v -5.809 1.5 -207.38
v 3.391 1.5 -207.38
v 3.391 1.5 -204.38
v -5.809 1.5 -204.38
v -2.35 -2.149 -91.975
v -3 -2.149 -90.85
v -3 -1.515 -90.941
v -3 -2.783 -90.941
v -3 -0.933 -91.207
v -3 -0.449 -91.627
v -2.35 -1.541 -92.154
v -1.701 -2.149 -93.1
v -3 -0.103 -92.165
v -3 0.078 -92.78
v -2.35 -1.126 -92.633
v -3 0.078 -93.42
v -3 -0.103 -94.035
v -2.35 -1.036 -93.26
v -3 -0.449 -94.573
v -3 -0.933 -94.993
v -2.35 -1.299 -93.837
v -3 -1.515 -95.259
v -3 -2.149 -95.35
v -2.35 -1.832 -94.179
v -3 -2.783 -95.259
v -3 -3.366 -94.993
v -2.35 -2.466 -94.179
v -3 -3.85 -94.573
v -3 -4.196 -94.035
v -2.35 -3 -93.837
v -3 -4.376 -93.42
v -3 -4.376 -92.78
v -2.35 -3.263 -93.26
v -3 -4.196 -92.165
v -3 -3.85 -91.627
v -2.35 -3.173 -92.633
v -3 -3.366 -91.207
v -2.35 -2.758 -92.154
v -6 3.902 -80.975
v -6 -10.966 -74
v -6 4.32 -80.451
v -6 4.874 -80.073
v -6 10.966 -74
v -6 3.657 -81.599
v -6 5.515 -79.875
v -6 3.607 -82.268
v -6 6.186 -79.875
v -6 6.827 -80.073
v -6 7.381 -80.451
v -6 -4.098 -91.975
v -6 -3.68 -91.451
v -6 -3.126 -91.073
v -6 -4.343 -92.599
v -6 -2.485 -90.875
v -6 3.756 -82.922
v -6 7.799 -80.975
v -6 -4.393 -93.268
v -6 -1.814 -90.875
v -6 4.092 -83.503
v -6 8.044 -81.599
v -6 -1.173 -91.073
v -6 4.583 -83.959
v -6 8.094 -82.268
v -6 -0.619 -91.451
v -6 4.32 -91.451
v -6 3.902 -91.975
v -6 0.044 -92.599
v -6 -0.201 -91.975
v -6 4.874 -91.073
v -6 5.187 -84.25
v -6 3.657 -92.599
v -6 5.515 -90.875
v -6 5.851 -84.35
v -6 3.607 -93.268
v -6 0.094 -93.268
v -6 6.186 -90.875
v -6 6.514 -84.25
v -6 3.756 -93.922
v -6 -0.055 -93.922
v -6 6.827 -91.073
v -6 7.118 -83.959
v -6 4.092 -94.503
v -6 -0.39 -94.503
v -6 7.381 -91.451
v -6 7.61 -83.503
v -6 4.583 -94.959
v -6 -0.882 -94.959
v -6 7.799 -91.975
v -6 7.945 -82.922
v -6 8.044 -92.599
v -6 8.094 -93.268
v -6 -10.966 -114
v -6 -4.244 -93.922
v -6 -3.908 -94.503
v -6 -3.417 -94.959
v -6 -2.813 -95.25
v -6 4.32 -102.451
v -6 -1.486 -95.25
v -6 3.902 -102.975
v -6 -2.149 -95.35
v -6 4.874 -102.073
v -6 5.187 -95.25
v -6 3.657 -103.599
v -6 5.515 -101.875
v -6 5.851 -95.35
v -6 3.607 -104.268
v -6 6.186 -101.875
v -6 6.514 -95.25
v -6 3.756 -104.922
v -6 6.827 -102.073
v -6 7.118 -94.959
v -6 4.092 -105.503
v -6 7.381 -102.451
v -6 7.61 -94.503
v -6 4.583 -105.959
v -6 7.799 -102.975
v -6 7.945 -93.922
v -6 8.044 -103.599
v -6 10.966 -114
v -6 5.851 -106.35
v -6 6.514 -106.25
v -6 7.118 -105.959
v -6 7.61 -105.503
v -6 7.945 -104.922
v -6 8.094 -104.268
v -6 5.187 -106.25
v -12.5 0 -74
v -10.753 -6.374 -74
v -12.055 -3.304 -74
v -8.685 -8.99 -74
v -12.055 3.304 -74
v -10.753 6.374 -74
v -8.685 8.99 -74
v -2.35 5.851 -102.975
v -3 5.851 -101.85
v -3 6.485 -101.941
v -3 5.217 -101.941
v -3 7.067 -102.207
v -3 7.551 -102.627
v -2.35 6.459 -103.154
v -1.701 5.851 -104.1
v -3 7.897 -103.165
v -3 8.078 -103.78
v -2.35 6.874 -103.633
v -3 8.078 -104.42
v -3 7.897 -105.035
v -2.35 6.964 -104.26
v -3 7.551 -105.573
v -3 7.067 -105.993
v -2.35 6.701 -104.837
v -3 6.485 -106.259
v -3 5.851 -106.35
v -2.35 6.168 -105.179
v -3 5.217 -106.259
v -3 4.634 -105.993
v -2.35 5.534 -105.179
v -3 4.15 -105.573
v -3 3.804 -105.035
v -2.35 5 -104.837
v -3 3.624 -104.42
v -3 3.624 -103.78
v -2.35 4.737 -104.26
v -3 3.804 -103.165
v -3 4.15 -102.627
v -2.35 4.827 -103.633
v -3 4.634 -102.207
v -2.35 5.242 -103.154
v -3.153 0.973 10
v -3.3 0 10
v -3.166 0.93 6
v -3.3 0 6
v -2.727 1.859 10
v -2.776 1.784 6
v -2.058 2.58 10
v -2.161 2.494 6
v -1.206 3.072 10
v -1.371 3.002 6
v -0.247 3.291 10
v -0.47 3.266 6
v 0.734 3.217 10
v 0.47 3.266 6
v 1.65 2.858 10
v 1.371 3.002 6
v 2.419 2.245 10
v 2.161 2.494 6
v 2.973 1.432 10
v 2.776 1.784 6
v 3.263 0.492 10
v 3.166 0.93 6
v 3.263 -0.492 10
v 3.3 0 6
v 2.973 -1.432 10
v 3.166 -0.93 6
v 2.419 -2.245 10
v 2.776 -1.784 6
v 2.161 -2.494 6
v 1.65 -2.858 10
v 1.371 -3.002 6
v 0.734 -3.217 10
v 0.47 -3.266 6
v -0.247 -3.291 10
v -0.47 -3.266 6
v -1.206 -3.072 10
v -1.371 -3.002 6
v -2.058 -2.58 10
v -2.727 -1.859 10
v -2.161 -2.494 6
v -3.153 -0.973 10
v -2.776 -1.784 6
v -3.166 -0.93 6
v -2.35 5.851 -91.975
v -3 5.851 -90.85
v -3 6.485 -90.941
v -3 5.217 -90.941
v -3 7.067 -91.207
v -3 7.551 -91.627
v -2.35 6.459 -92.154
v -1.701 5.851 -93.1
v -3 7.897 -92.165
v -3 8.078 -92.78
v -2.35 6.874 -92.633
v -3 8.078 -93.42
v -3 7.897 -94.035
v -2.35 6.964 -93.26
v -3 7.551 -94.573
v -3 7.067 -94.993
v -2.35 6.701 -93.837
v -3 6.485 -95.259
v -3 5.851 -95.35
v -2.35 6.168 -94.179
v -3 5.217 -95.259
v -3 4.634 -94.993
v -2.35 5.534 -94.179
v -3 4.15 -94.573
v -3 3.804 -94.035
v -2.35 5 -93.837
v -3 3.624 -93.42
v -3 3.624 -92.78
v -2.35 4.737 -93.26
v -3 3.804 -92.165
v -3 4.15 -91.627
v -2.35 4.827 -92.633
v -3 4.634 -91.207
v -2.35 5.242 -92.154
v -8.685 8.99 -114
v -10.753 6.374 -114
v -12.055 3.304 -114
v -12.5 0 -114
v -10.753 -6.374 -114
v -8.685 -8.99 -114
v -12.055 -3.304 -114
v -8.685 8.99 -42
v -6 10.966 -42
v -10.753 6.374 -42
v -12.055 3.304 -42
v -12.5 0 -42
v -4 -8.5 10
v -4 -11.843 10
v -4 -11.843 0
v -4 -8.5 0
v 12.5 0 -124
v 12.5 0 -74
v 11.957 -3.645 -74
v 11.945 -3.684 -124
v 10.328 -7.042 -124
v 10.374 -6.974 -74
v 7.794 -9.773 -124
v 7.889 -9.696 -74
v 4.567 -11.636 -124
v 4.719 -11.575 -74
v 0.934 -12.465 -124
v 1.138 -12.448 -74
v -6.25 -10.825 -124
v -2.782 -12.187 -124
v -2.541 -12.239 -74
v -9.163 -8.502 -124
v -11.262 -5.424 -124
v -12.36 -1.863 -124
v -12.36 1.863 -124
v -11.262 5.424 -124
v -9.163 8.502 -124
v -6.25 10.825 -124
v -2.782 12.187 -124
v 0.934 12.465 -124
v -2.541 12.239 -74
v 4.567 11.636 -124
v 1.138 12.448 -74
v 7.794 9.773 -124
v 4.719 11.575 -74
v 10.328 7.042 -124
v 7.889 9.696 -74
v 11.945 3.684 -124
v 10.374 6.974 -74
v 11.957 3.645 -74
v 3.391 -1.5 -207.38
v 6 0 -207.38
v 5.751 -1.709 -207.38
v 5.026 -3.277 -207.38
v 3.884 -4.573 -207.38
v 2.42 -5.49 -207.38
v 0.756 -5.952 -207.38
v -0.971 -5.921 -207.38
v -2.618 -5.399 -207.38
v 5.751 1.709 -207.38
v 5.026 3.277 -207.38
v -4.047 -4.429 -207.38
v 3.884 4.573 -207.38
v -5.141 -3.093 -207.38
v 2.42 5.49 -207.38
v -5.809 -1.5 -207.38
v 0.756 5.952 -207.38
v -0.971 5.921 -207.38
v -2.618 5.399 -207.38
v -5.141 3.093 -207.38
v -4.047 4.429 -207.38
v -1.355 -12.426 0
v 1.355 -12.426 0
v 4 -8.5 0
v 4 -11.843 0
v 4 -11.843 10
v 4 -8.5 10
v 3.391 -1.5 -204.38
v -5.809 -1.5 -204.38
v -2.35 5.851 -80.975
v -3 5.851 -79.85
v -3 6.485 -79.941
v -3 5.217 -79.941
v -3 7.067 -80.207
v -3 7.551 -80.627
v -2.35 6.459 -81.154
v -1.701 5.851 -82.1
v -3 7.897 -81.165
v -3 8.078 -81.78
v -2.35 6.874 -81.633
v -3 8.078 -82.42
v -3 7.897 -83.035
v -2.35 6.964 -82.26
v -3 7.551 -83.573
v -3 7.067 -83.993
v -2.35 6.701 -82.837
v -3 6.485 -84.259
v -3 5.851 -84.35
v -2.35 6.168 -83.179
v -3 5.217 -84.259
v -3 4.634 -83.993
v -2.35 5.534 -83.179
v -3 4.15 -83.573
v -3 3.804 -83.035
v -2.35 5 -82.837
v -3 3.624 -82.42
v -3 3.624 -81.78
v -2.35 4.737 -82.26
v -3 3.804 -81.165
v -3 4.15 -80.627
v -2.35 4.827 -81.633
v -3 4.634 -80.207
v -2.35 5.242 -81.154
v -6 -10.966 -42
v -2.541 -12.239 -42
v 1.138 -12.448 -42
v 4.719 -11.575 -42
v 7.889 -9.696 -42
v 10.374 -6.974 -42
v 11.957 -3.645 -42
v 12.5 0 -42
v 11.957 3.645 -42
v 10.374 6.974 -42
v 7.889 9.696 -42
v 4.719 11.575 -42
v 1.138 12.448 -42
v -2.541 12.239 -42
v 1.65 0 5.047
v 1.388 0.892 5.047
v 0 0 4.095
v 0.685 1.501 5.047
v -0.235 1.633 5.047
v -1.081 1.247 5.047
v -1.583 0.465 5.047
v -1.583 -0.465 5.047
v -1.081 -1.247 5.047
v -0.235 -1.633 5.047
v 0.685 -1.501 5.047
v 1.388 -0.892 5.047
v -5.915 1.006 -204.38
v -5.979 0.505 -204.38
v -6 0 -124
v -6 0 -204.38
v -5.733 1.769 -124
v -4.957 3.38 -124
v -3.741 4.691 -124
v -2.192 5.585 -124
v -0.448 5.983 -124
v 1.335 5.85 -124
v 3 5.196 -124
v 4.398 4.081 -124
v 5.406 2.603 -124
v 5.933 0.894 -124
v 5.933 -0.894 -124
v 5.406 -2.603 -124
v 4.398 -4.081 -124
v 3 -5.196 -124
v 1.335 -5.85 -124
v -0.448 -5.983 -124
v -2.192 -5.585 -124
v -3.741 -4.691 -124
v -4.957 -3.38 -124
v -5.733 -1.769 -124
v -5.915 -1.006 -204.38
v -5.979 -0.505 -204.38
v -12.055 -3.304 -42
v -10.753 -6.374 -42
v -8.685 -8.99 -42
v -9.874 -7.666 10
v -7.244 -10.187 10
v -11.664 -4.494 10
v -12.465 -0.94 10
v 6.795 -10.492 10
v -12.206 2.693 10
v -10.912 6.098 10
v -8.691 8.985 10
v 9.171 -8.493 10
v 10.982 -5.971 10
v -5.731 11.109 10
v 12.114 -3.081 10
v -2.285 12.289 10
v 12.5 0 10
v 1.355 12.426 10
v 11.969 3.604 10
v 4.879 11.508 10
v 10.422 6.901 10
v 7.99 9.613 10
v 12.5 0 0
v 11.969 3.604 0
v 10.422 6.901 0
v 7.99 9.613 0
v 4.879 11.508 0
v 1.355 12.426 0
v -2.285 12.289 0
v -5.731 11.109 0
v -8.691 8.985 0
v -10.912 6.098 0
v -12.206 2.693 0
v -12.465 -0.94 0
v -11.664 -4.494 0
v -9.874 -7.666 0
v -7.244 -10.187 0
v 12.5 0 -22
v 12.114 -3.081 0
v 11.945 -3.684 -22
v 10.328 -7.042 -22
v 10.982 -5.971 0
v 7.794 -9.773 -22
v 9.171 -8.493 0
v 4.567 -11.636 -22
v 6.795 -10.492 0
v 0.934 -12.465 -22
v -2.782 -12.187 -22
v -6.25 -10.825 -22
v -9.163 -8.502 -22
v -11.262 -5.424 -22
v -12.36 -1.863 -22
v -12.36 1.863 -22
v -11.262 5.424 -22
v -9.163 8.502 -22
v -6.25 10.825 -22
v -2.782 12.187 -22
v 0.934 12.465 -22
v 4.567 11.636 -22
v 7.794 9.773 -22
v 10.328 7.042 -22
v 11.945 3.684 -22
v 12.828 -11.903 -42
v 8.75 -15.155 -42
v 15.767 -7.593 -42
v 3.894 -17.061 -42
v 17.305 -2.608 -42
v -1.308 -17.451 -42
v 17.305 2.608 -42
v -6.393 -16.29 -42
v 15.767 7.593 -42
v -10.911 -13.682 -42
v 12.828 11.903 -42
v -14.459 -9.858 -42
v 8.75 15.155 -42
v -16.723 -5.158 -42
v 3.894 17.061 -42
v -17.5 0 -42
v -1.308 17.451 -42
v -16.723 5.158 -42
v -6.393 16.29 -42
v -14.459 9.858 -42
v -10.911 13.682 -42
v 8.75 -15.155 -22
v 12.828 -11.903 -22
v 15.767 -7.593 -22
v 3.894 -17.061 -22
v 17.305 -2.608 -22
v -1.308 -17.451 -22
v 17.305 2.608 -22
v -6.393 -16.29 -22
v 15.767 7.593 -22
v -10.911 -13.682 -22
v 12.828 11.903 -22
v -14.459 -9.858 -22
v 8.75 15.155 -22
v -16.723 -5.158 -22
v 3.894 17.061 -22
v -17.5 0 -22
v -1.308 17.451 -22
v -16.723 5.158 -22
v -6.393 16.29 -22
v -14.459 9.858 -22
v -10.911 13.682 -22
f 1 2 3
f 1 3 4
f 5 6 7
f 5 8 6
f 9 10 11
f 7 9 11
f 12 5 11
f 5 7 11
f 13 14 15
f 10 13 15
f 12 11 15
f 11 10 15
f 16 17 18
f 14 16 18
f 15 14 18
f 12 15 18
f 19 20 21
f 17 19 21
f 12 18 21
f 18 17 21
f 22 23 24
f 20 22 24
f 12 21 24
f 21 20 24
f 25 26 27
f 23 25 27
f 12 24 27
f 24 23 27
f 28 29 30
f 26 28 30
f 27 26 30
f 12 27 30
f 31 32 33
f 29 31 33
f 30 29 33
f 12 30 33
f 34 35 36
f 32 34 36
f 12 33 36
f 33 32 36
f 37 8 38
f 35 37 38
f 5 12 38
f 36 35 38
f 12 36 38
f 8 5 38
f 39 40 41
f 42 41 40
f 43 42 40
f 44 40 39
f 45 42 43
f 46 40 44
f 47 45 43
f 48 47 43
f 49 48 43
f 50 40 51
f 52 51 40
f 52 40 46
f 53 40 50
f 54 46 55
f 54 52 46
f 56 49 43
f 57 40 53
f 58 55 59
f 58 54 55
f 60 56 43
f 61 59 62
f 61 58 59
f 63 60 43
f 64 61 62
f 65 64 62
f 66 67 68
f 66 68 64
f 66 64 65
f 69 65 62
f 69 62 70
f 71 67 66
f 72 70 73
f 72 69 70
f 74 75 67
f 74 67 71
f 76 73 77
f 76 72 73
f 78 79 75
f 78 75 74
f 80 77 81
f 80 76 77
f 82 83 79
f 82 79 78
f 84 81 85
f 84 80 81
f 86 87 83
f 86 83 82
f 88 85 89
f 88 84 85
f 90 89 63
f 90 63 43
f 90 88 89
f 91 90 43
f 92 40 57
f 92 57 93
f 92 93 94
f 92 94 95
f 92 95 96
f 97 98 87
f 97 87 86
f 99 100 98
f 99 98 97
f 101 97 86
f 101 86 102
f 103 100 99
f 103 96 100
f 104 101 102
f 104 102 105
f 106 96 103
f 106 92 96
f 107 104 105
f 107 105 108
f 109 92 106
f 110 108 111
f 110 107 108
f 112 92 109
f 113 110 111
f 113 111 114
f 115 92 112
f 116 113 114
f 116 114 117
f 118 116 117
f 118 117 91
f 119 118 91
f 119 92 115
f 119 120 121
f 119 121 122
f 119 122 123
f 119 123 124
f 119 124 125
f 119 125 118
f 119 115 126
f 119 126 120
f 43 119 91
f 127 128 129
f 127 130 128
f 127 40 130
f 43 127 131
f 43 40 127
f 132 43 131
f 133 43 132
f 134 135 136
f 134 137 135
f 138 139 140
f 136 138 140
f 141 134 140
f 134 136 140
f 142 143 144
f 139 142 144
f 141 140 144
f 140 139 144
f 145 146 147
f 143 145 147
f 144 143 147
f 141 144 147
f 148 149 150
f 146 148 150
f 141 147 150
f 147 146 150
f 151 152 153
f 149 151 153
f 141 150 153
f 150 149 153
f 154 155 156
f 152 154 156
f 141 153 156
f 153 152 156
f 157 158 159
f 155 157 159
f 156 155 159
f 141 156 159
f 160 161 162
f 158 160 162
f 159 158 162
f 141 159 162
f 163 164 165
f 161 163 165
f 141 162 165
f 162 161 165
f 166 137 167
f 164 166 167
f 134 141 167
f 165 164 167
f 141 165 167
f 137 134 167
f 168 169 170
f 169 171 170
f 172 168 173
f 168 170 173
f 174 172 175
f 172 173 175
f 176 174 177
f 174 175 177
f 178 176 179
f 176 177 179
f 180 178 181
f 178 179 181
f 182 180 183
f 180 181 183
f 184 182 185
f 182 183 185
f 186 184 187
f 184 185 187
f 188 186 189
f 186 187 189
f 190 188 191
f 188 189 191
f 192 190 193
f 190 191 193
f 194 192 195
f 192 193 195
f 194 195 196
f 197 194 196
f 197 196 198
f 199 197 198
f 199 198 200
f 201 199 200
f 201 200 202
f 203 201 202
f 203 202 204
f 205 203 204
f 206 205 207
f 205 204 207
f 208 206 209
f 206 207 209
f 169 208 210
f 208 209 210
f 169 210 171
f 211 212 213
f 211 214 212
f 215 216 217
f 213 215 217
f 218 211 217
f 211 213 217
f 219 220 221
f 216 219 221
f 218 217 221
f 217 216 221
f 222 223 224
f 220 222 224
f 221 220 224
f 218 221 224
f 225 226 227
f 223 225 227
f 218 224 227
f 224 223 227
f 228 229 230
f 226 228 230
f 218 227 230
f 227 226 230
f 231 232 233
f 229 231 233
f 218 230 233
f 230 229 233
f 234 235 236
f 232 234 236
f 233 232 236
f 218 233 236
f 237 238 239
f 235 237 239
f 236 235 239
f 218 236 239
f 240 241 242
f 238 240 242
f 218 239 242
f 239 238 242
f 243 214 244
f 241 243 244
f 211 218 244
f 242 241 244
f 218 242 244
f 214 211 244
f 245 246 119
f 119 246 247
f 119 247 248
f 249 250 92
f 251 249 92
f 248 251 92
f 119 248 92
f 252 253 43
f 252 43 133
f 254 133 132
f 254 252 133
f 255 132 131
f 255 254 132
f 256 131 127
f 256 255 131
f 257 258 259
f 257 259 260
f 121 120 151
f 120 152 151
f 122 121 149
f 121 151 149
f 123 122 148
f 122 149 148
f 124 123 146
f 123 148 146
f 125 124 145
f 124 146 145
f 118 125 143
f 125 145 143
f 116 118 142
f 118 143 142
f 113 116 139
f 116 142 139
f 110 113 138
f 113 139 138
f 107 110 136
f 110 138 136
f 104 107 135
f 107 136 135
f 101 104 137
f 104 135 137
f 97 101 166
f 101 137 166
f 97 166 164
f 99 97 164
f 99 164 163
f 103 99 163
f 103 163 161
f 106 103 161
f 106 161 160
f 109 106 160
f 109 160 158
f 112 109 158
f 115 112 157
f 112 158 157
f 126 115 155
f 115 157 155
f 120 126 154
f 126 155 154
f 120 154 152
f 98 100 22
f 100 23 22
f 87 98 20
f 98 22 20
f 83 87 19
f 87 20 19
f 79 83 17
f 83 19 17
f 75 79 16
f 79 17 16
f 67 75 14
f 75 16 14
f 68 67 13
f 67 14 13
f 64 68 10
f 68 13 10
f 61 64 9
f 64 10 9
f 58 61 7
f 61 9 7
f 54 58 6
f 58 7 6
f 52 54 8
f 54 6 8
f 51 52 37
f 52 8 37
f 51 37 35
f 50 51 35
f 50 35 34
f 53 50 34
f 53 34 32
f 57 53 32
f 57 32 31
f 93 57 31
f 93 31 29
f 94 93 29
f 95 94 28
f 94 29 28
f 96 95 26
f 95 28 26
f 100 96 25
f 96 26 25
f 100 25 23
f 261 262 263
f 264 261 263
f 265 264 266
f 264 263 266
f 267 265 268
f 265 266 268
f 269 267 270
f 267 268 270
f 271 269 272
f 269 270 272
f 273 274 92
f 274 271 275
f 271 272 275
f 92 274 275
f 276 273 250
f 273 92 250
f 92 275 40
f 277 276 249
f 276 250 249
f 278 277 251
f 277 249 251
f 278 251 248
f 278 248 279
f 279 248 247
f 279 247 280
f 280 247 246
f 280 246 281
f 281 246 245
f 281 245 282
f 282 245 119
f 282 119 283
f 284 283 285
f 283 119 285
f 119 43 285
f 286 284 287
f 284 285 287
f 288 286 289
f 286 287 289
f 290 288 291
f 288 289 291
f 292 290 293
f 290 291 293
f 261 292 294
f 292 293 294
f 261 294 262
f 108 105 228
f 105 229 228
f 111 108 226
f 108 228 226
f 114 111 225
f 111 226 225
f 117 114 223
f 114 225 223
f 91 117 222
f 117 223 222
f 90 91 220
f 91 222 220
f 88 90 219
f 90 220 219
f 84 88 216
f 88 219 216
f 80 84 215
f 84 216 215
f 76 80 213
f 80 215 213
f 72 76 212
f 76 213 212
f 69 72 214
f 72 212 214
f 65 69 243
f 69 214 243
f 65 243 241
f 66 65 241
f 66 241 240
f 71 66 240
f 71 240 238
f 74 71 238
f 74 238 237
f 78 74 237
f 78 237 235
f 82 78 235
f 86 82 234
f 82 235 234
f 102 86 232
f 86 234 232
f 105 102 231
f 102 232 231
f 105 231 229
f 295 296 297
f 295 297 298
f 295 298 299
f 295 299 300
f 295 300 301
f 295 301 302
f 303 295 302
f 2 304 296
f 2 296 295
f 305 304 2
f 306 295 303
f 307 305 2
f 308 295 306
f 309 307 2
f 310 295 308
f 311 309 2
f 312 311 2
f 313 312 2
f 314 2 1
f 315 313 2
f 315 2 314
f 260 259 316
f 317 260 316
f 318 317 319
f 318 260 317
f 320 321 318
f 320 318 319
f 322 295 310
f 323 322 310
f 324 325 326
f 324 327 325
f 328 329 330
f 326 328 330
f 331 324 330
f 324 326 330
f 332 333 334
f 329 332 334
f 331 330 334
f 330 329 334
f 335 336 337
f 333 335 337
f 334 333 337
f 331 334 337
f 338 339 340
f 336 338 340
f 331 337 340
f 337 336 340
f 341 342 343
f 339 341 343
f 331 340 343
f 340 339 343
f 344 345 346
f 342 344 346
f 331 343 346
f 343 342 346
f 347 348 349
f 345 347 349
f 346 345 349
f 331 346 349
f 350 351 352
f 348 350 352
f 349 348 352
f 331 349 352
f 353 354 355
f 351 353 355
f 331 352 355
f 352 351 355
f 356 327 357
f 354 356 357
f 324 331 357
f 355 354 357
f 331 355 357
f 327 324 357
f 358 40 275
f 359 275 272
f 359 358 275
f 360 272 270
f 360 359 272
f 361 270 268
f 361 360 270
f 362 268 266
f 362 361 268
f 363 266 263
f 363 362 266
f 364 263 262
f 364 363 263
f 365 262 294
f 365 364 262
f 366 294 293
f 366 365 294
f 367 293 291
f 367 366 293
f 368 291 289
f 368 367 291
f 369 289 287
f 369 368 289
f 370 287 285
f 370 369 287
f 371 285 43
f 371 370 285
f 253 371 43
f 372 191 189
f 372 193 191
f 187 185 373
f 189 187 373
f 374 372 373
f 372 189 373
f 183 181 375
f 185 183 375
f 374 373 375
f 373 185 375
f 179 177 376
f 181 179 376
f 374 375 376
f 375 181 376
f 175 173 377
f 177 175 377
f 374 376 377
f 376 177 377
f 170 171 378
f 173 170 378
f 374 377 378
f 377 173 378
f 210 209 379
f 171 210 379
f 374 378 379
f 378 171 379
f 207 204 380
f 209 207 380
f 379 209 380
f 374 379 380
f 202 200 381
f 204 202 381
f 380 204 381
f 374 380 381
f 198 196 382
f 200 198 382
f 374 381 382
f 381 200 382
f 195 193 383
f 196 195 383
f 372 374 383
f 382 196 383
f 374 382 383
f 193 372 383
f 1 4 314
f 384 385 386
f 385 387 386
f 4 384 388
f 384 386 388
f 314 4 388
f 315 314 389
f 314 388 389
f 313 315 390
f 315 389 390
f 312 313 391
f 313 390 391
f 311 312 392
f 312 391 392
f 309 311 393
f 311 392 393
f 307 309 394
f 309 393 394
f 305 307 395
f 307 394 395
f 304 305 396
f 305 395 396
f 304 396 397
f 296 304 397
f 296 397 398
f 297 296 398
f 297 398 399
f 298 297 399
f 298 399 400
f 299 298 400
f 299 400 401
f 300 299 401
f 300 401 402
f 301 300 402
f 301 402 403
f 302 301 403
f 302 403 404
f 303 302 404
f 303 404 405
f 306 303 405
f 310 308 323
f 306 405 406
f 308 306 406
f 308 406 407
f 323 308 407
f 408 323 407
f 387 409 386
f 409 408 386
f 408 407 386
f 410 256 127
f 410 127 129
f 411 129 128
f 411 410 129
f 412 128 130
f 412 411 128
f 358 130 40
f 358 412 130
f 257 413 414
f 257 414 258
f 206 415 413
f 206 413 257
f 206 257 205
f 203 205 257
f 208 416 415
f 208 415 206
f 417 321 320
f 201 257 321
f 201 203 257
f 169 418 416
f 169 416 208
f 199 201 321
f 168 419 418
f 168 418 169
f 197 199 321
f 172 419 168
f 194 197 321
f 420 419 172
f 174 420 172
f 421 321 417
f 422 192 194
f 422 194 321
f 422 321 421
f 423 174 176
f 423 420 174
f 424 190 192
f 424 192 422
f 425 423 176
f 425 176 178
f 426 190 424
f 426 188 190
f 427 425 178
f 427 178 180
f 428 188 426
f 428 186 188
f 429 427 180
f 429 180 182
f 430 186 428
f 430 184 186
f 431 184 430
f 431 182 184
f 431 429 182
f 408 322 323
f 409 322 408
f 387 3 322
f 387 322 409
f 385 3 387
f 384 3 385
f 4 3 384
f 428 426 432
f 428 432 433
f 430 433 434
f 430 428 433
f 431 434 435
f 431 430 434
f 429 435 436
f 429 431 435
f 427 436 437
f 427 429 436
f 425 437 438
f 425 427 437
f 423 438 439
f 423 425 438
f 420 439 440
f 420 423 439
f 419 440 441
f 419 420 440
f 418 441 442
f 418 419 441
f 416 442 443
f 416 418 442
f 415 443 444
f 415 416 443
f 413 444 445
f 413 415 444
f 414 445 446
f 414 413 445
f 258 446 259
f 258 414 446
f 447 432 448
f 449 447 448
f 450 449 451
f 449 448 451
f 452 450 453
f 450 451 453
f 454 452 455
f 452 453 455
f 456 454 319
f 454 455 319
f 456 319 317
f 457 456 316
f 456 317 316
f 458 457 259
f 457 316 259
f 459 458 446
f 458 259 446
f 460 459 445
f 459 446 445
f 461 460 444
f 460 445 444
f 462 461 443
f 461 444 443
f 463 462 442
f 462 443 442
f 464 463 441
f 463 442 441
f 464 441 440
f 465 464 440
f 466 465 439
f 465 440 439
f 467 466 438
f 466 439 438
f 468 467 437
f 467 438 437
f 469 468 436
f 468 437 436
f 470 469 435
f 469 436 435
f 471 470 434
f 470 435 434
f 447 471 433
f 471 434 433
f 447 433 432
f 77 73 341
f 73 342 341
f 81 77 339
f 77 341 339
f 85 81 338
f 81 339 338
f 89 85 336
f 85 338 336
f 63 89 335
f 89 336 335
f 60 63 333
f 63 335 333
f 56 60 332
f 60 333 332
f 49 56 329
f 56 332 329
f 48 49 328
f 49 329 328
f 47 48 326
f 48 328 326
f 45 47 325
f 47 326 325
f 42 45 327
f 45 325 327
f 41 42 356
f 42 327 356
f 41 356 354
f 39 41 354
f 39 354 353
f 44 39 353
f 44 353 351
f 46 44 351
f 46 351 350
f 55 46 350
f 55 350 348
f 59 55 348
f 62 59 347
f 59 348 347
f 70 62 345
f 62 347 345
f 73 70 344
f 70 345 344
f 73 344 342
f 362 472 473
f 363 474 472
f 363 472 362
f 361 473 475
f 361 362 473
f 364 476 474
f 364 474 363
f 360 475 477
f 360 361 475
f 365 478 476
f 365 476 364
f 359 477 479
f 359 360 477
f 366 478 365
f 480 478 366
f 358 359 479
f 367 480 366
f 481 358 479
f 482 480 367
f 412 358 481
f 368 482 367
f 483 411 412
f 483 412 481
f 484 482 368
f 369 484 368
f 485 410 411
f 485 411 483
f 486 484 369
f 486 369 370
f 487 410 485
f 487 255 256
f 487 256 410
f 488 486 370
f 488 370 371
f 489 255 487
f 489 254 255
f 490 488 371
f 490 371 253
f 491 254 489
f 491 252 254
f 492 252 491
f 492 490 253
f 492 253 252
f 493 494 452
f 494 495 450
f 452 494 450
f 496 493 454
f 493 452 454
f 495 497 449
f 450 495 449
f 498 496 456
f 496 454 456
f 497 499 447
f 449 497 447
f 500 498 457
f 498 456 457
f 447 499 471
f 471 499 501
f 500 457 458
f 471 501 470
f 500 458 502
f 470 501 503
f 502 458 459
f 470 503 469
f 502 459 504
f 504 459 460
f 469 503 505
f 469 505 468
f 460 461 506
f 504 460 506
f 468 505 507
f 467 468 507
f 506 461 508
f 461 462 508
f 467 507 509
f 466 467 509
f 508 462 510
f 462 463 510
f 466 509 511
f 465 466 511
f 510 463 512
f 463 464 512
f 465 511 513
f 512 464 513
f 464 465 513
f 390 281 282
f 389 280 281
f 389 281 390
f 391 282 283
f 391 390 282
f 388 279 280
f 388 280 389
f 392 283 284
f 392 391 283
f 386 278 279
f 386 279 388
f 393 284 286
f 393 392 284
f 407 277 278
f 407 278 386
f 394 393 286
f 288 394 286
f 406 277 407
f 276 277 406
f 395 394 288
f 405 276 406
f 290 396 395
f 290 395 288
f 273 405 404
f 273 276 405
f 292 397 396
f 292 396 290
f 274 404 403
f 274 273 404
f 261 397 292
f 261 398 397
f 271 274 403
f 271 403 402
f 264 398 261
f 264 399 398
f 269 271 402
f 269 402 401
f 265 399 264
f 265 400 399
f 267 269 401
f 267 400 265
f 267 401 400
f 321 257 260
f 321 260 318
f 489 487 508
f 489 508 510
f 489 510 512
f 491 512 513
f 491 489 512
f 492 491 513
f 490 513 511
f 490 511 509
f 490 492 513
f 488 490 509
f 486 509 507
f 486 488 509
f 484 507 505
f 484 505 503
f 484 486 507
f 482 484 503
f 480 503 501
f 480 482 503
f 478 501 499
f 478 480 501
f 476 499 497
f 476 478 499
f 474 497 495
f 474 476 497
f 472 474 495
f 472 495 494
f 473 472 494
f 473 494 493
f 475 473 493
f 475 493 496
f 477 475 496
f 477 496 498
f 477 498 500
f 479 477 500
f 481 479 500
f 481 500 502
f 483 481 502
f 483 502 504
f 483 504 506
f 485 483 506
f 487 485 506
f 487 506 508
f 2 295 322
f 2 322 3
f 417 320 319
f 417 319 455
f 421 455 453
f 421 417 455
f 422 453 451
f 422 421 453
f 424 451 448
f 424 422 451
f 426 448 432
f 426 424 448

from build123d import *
from build123d.topology import SkipClean

# Parameters (mm, degrees)
ESQUISSE1_R                                = 30
BOSS_EXTRU_1_DEPTH                         = 15
ESQUISSE2_R                                = 12.5
BOSS_EXTRU_2_DEPTH                         = 124
ESQUISSE4_2_W                              = 230
ESQUISSE4_2_H                              = 40
ENL_V_MAT_EXTRU_1_DEPTH                    = 5
CHAMBRAGE_POUR_VIS_T_TE_HEXAGONALE_2_COUNT = 2
CHAMBRAGE_POUR_VIS_T_TE_HEXAGONALE_2_PITCH = 41
ESQUISSE17_R                               = 6
BOSS_EXTRU_4_DEPTH                         = 83.38
ESQUISSE18_W                               = 10.356322474
ESQUISSE18_H                               = 3
ENL_V_MAT_EXTRU_2_DEPTH                    = 3
ESQUISSE19_W                               = 7.933443835
ESQUISSE19_H                               = 21.9317122
ENL_V_MAT_EXTRU_3_DEPTH                    = 50
BOSS_EXTRU_6_START                         = -10
ESQUISSE21_R                               = 12.5
BOSS_EXTRU_6_DEPTH                         = 10
D_GAGEMENT_M41_D                           = 4.5
D_GAGEMENT_M41_DEPTH                       = 3
D_GAGEMENT_M41_TIP                         = 1.299038106
ESQUISSE26_R                               = 17.5
BOSS_EXTRU_8_DEPTH                         = 52
ENL_V_START                                = -32
ESQUISSE27_R                               = 17.5
ENL_V_MAT_EXTRU_5_DEPTH                    = 32
ENL_V_START_2                              = -15
ESQUISSE28_R                               = 30
ENL_V_MAT_EXTRU_6_DEPTH                    = 15
BOSS_EXTRU_9_START                         = 10
BOSS_EXTRU_9_DEPTH                         = 10
D_GAGEMENT_M61_D                           = 6.6
D_GAGEMENT_M61_DEPTH                       = 4
D_GAGEMENT_M61_TIP                         = 1.905255888


with BuildPart() as part:
    # Esquisse1 → Boss.-Extru.1 (new body)
    with BuildSketch(Plane.XY):
        Circle(ESQUISSE1_R)
    extrude(amount=BOSS_EXTRU_1_DEPTH)

    # Esquisse2 → Boss.-Extru.2 (add)
    with BuildSketch(Plane(origin=(0, 0, 0), x_dir=(-1, 0, 0), z_dir=(0, 0, -1))):
        Circle(ESQUISSE2_R)
    extrude(amount=BOSS_EXTRU_2_DEPTH)

    # Esquisse4<2> → Enlèv. mat.-Extru.1 (cut)
    with BuildSketch(Plane.XY.offset(15)):
        Rectangle(ESQUISSE4_2_W, ESQUISSE4_2_H)
    extrude(amount=-ENL_V_MAT_EXTRU_1_DEPTH, mode=Mode.SUBTRACT)

    # Esquisse14 → Chambrage pour vis à tête hexagonale M51 (revolve, cut)
    with BuildSketch(Plane.YZ.offset(-20.5)):
        Polygon((0, 0), (0, 15), (2.75, 15), (2.75, 3.605), (2.775, 3.58), (6.12, 3.58), (6.12, 0), align=None)
    chambrage_pour_vis_t_te_hexagonale_m51 = revolve(axis=Axis((-20.5, 0, -6.35), (0, 0, 1)), mode=Mode.SUBTRACT)

    # Chambrage pour vis _ t_te hexagonale 2: Chambrage pour vis à tête hexagonale M51 ×2
    with Locations(*[(i * CHAMBRAGE_POUR_VIS_T_TE_HEXAGONALE_2_PITCH, 0, 0) for i in range(1, CHAMBRAGE_POUR_VIS_T_TE_HEXAGONALE_2_COUNT)]):
        add(chambrage_pour_vis_t_te_hexagonale_m51, mode=Mode.SUBTRACT)

    # Esquisse17 → Boss.-Extru.4 (add)
    with BuildSketch(Plane(origin=(0, 0, -124), x_dir=(-1, 0, 0), z_dir=(0, 0, -1))):
        Circle(ESQUISSE17_R)
    extrude(amount=BOSS_EXTRU_4_DEPTH)

    # Esquisse18 → Enlèv. mat.-Extru.2 (cut)
    with BuildSketch(Plane(origin=(0, 0, -207.38), x_dir=(-1, 0, 0), z_dir=(0, 0, -1))):
        with Locations((1.787207702, 0)):
            Rectangle(ESQUISSE18_W, ESQUISSE18_H)
    extrude(amount=-ENL_V_MAT_EXTRU_2_DEPTH, mode=Mode.SUBTRACT)

    # Esquisse19 → Enlèv. mat.-Extru.3 (cut)
    with BuildSketch(Plane(origin=(0, 0, -124), x_dir=(-1, 0, 0), z_dir=(0, 0, -1))):
        with Locations((9.966721917, 0)):
            Rectangle(ESQUISSE19_W, ESQUISSE19_H)
    extrude(amount=-ENL_V_MAT_EXTRU_3_DEPTH, mode=Mode.SUBTRACT)

    # Esquisse21 → Boss.-Extru.6 (add)
    with BuildSketch(Plane(origin=(0, 0, -124), x_dir=(-1, 0, 0), z_dir=(0, 0, -1)).offset(BOSS_EXTRU_6_START)):
        Circle(ESQUISSE21_R)
    extrude(amount=BOSS_EXTRU_6_DEPTH)

    # Dégagement M41
    with Locations(Plane.ZY.offset(6)):
        with Locations((-82.1, 5.85067254), (-93.1, -2.14932746), (-93.1, 5.85067254), (-104.1, 5.85067254)):
            Hole(D_GAGEMENT_M41_D / 2, depth=D_GAGEMENT_M41_DEPTH)
            with Locations((0, 0, -(D_GAGEMENT_M41_DEPTH + D_GAGEMENT_M41_TIP / 2))):  # 120° drill point
                Cone(0, D_GAGEMENT_M41_D / 2, D_GAGEMENT_M41_TIP, mode=Mode.SUBTRACT)

    # Esquisse26 → Boss.-Extru.8 (add)
    with BuildSketch(Plane(origin=(0, 0, -74), x_dir=(-1, 0, 0), z_dir=(0, 0, -1))):
        Circle(ESQUISSE26_R)
    extrude(amount=-BOSS_EXTRU_8_DEPTH)

    # Esquisse27 → Enlèv. mat.-Extru.5 (cut)
    with BuildSketch(Plane(origin=(0, 0, -74), x_dir=(-1, 0, 0), z_dir=(0, 0, -1)).offset(ENL_V_START)):
        Circle(ESQUISSE27_R)
        with BuildLine():
            ThreePointArc((6, 10.9658561), (10.752906584, 6.373774392), (12.5, 0))
            ThreePointArc((12.5, 0), (10.752906584, -6.373774392), (6, -10.9658561))
            ThreePointArc((6, -10.9658561), (-12.5, 0), (6, 10.9658561))
        make_face(mode=Mode.SUBTRACT)
    extrude(amount=ENL_V_MAT_EXTRU_5_DEPTH, mode=Mode.SUBTRACT)

    # Esquisse28 → Enlèv. mat.-Extru.6 (cut)
    with BuildSketch(Plane.XY.offset(15).offset(ENL_V_START_2)):
        Circle(ESQUISSE28_R)
    extrude(amount=ENL_V_MAT_EXTRU_6_DEPTH, mode=Mode.SUBTRACT)

    # Esquisse29 → Boss.-Extru.9 (add)
    with SkipClean():  # the faces are left unmerged after this step: merging them gives an invalid solid
        with BuildSketch(Plane.XY.offset(BOSS_EXTRU_9_START)):
            with BuildLine():
                Line((-4, -11.842719282), (-4, -8.5))
                Line((-4, -8.5), (4, -8.5))
                Line((4, -8.5), (4, -11.842719282))
                ThreePointArc((4, -11.842719282), (10.155048006, -7.288689869), (12.5, 0))
                ThreePointArc((12.5, 0), (-7.288689869, 10.155048006), (-4, -11.842719282))
            make_face()
        extrude(amount=-BOSS_EXTRU_9_DEPTH)

    # Dégagement M61
    with Locations(Plane.XY.offset(10)):
        with Locations((0, 0)):
            Hole(D_GAGEMENT_M61_D / 2, depth=D_GAGEMENT_M61_DEPTH)
            with Locations((0, 0, -(D_GAGEMENT_M61_DEPTH + D_GAGEMENT_M61_TIP / 2))):  # 120° drill point
                Cone(0, D_GAGEMENT_M61_D / 2, D_GAGEMENT_M61_TIP, mode=Mode.SUBTRACT)


solid = part.part
